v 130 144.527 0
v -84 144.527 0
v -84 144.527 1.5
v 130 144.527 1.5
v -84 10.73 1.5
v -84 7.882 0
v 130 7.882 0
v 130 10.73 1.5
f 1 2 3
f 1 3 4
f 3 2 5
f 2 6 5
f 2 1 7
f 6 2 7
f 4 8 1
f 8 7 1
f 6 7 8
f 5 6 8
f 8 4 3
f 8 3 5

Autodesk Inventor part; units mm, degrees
ref_plane "YZ Plane" through (0, 0, 0) normal (1, 0, 0) x (0, 1, 0)
ref_plane "XZ Plane" through (0, 0, 0) normal (0, 1, 0) x (-1, 0, 0)
ref_plane "XY Plane" through (0, 0, 0) normal (0, 0, 1) x (1, 0, 0)
sketch "Эскиз1" plane through (0, 0, 0) normal (0, 0, 1) x (1, 0, 0)
  line L0 (0, 0) -> (130, 0)
  line L1 (130, 0) -> (130, 240)
  line L2 (130, 240) -> (0, 240)
  line L3 (0, 240) -> (0, 0)
  dimension "d0" = 130
  dimension "d1" = 240
extrude "Выдавливание1" add sketch "Эскиз1" along normal blind 1.5
ref_plane "РабПлоскость1" through (130, 7.8819, 0) normal (1, 0, 0) x (0, 0, -1)
sketch "Эскиз3" plane through (130, 7.8819, 0) normal (1, 0, 0) x (0, 0, -1)
  line L0 (-1.5, 2.8482) -> (0, 0) projected
  line L1 (0, 0) -> (-1.5, 2.8482)
  line L2 (0, -7.8819) -> (0, 232.1181) projected
  line L3 (0, 232.1181) -> (-1.5, 232.1181) projected
  line L4 (-1.5, -7.8819) -> (-1.5, 232.1181) projected
  line L5 (0, -7.8819) -> (-1.5, -7.8819) projected
  point P0 (0, -7.8819)
  point P1 (0, 0)
  point P2 (-1.5, 2.8482)
extrude "Выдавливание3" cut sketch "Эскиз3" against normal through all contours L0 L2 L5 L4
sketch "Эскиз4" plane through (0, 0, 0) normal (0, 0, -1) x (-1, 0, 0)
  line L0 (-186.9271, 194.527) -> (57.0729, 194.527) projected
  line L1 (-130, 7.8819) -> (0, 7.8819) projected
  line L2 (0, 240) -> (0, 7.8819) projected
  line L3 (-130, 240) -> (0, 240) projected
  line L4 (-130, 7.8819) -> (-130, 240) projected
  point P0 (0, 0)
  point P1 (-130, 194.527)
  point P2 (0, 194.527)
extrude "Выдавливание4" cut sketch "Эскиз4" against normal blind 10 contours L4 L3 L2 L0
sketch "Эскиз5" plane through (0, 7.8819, 0) normal (-1, 0, 0) x (0, 0, 1)
  line L0 (1.5, 186.6451) -> (0, 186.6451) projected
  line L1 (0, 186.6451) -> (0, 0) projected
  line L2 (0, 0) -> (1.5, 2.8482) projected
  line L3 (1.5, 186.6451) -> (1.5, 2.8482) projected
  point P0 (0, -7.8819)
extrude "Выдавливание5" add sketch "Эскиз5" along normal blind 84
sketch "Эскиз6" plane through (130, 7.8819, 0) normal (1, 0, 0) x (0, 0, -1)
  line L0 (0, 186.6451) -> (0, 0) projected
  line L1 (0, 0) -> (-1.5, 2.8482) projected
  line L2 (-1.5, 2.8482) -> (-1.5, 186.6451) projected
  line L3 (-1.5, 186.6451) -> (0, 186.6451) projected
  line L4 (8.5, 202.2968) -> (8.5, 0)
  circle A0 centre (515.0502, 101.1484) radius 516.5502
  circle A1 centre (515.0502, 101.1484) radius 514.5502
  point P0 (0, -7.8819)
  point P1 (8.5, 10.767)
  point P2 (8.5, 191.5298)
  point P3 (0, 140.4854)
  point P4 (0, 61.8114)
  dimension "d14" = 10
  dimension "d15" = 2
sketch "Эскиз7" plane through (-84, 7.8819, 0) normal (-1, 0, 0) x (0, 0, 1)
  point P0 (0, -7.8819)
sketch "Эскиз8" plane through (130, 10.73, 1.5) normal (1, 0, 0) x (0, 0, -1)
  line L0 (74.6894, 55.2388) -> (-105.8733, 389.5996) projected
  line L1 (1.0792, 191.548) -> (24.6268, 147.9433)
  line L2 (24.6268, 147.9433) -> (43.5247, 158.1486)
  line L3 (43.5247, 158.1486) -> (19.9771, 201.7533)
  line L4 (19.9771, 201.7533) -> (1.0792, 191.548)
  point P0 (1.5, -10.73)
extrude "Выдавливание7" cut sketch "Эскиз8" against normal through all
sketch "Эскиз9" plane through (-84, 7.8819, 0) normal (-1, 0, 0) x (0, 0, 1)
  line L0 (0, 186.6451) -> (0, 0) projected
  line L1 (0, 0) -> (1.5, 2.8482) projected
  line L2 (1.5, 2.8482) -> (1.5, 186.6451) projected
  arc A0 (-8.5, 0) -> (0, 140.4854) centre (-515.0502, 101.1484) ccw
  line L3 (1.5, 186.6451) -> (0, 186.6451) projected
  point P0 (0, -7.8819)
sketch "Эскиз10" plane through (0, 0, 0) normal (0, 0, -1) x (-1, 0, 0)
  line L0 (84, 194.527) -> (-130, 194.527) projected
  line L1 (84, 10.73) -> (84, 194.527) projected
  line L2 (-130, 194.527) -> (84, 194.527)
  line L3 (84, 194.527) -> (84, 144.527)
  line L4 (84, 144.527) -> (-130, 144.527)
  line L5 (-130, 144.527) -> (-130, 194.527)
  point P0 (0, 0)
  dimension "d22" = 50
extrude "Выдавливание8" cut sketch "Эскиз10" against normal blind 10
properties part number "наклон"
